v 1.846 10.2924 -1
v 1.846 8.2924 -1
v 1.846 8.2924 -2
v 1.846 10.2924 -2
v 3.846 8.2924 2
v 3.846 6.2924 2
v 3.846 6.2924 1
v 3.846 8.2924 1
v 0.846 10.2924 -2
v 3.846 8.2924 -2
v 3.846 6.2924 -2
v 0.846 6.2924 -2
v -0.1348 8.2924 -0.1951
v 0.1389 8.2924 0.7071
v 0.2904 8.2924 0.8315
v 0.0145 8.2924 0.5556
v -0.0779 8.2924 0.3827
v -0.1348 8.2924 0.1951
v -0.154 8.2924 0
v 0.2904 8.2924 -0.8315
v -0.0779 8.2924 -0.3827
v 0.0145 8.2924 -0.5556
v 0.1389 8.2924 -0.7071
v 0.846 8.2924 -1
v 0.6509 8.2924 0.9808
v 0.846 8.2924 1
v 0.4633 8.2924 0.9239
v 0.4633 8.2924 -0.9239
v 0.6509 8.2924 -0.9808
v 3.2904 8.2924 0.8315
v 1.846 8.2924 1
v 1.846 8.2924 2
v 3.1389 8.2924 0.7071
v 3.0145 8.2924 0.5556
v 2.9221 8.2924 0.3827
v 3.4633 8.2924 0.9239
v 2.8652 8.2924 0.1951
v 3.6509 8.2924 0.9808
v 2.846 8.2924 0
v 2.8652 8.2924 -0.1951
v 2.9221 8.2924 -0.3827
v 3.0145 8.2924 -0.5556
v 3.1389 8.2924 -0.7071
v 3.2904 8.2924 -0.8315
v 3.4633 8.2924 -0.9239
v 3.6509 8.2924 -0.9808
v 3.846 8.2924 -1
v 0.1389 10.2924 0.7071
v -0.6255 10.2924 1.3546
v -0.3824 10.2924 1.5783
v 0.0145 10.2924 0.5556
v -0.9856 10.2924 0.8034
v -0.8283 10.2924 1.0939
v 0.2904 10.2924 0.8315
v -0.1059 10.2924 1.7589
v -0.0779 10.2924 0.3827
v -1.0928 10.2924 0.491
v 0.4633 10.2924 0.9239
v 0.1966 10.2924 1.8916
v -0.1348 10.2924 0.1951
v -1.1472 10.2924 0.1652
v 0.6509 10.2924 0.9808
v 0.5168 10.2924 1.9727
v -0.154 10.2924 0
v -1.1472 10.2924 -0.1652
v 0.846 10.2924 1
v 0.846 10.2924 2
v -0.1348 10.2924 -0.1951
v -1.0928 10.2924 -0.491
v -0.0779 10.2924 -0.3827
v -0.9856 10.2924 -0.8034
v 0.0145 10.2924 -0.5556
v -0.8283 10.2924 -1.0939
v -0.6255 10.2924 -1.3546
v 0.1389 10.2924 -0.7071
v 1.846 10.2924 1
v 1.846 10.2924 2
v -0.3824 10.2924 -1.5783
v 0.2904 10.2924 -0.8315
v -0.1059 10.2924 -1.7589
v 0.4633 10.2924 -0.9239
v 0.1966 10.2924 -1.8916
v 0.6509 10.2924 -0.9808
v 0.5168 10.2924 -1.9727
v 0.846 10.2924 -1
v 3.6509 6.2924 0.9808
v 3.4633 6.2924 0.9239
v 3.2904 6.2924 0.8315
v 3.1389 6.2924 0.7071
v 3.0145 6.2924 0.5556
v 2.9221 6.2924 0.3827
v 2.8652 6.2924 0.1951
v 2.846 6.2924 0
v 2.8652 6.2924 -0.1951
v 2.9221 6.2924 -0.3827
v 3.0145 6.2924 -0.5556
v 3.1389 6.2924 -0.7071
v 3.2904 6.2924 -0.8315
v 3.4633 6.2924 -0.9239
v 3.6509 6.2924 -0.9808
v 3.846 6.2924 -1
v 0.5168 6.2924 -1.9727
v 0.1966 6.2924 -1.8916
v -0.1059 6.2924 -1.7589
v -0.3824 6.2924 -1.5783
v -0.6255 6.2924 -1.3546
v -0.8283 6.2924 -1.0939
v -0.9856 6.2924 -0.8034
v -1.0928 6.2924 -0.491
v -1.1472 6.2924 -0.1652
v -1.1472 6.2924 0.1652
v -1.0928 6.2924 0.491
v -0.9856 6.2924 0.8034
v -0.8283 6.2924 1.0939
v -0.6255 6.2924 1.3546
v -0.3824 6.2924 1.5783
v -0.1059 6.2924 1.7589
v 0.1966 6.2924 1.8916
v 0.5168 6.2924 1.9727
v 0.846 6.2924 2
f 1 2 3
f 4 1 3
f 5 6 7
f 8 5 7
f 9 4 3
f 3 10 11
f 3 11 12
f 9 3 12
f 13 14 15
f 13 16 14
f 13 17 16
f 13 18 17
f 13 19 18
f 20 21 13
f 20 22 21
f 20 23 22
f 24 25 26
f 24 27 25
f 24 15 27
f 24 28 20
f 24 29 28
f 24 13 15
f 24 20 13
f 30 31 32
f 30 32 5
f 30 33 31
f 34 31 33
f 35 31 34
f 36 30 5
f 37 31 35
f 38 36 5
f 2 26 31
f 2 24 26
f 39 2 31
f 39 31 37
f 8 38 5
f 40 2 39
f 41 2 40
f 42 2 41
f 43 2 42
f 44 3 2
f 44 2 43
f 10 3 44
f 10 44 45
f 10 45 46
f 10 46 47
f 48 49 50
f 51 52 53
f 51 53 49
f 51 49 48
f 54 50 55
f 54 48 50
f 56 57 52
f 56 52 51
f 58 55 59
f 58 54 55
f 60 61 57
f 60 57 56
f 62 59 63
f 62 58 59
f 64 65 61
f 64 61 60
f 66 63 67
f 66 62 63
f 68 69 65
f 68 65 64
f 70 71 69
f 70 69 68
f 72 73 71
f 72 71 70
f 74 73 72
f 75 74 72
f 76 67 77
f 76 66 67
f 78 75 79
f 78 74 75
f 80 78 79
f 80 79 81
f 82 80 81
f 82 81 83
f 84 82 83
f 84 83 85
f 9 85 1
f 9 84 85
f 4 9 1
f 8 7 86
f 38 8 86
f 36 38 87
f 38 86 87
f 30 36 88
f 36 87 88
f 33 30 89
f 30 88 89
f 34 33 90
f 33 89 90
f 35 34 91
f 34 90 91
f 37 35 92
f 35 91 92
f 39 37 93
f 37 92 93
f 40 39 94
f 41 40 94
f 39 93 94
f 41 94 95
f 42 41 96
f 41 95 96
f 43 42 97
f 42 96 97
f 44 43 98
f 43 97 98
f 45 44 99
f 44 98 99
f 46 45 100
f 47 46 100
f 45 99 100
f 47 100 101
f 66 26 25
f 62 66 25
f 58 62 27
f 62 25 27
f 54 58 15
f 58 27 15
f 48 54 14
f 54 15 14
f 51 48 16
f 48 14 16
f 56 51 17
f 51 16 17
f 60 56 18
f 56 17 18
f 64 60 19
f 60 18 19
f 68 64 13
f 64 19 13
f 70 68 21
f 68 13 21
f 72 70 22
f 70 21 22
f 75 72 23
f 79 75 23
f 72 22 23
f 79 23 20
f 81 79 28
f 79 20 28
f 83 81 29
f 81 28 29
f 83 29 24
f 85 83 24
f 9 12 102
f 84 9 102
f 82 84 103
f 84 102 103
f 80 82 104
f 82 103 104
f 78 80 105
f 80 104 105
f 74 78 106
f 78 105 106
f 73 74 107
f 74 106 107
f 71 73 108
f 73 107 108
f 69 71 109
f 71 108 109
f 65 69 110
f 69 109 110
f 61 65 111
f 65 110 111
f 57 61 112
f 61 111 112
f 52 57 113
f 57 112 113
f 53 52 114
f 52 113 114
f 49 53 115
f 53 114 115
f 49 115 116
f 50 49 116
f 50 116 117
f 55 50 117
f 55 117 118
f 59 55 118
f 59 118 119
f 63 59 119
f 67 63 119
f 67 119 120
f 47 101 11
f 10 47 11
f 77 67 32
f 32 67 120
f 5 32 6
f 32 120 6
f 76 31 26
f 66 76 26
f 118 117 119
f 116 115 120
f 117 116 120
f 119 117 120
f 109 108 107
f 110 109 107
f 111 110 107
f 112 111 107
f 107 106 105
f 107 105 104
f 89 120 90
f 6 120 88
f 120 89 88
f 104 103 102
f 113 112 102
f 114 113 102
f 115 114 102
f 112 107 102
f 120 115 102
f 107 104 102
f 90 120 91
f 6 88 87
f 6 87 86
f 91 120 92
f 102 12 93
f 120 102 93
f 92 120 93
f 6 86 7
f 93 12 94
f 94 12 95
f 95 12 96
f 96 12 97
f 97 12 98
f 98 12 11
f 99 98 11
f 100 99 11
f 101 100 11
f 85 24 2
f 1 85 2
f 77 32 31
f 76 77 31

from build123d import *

# Parameters (mm, degrees)
EXTRUDE_1_DEPTH = 10
EXTRUDE_2_DEPTH = 20
SCALE_1_SCALE   = 0.2


with BuildPart() as part:
    # 草圖1 → 填料-伸長1 (new body)
    with BuildSketch(Plane(origin=(0, 0, 0), x_dir=(1, 0, 0), z_dir=(0, 1, 0))):
        with BuildLine():
            Line((15, 10), (0, 10))
            ThreePointArc((0, 10), (-10, 0), (0, -10))
            Line((0, -10), (15, -10))
            Line((15, -10), (15, -5))
            ThreePointArc((15, -5), (10, 0), (15, 5))
            Line((15, 5), (15, 10))
        make_face()
    extrude(amount=EXTRUDE_1_DEPTH)

    # 草圖1<3> → 填料-伸長2 (add)
    with BuildSketch(Plane(origin=(0, 0, 0), x_dir=(1, 0, 0), z_dir=(0, 1, 0))):
        with BuildLine():
            Line((5, 5), (5, 10))
            Line((5, 10), (0, 10))
            ThreePointArc((0, 10), (-10, 0), (0, -10))
            Line((0, -10), (5, -10))
            Line((5, -10), (5, -5))
            Line((5, -5), (0, -5))
            ThreePointArc((0, -5), (-5, 0), (0, 5))
            Line((0, 5), (5, 5))
        make_face()
    extrude(amount=EXTRUDE_2_DEPTH)


with BuildPart() as part_1:
    # 縮放比例1: scaled about (1.057486584, 7.865508049, 0)
    add(part.part.scale(SCALE_1_SCALE).moved(Location((0.845989267, 6.292406439, 0))))


solid = part_1.part
